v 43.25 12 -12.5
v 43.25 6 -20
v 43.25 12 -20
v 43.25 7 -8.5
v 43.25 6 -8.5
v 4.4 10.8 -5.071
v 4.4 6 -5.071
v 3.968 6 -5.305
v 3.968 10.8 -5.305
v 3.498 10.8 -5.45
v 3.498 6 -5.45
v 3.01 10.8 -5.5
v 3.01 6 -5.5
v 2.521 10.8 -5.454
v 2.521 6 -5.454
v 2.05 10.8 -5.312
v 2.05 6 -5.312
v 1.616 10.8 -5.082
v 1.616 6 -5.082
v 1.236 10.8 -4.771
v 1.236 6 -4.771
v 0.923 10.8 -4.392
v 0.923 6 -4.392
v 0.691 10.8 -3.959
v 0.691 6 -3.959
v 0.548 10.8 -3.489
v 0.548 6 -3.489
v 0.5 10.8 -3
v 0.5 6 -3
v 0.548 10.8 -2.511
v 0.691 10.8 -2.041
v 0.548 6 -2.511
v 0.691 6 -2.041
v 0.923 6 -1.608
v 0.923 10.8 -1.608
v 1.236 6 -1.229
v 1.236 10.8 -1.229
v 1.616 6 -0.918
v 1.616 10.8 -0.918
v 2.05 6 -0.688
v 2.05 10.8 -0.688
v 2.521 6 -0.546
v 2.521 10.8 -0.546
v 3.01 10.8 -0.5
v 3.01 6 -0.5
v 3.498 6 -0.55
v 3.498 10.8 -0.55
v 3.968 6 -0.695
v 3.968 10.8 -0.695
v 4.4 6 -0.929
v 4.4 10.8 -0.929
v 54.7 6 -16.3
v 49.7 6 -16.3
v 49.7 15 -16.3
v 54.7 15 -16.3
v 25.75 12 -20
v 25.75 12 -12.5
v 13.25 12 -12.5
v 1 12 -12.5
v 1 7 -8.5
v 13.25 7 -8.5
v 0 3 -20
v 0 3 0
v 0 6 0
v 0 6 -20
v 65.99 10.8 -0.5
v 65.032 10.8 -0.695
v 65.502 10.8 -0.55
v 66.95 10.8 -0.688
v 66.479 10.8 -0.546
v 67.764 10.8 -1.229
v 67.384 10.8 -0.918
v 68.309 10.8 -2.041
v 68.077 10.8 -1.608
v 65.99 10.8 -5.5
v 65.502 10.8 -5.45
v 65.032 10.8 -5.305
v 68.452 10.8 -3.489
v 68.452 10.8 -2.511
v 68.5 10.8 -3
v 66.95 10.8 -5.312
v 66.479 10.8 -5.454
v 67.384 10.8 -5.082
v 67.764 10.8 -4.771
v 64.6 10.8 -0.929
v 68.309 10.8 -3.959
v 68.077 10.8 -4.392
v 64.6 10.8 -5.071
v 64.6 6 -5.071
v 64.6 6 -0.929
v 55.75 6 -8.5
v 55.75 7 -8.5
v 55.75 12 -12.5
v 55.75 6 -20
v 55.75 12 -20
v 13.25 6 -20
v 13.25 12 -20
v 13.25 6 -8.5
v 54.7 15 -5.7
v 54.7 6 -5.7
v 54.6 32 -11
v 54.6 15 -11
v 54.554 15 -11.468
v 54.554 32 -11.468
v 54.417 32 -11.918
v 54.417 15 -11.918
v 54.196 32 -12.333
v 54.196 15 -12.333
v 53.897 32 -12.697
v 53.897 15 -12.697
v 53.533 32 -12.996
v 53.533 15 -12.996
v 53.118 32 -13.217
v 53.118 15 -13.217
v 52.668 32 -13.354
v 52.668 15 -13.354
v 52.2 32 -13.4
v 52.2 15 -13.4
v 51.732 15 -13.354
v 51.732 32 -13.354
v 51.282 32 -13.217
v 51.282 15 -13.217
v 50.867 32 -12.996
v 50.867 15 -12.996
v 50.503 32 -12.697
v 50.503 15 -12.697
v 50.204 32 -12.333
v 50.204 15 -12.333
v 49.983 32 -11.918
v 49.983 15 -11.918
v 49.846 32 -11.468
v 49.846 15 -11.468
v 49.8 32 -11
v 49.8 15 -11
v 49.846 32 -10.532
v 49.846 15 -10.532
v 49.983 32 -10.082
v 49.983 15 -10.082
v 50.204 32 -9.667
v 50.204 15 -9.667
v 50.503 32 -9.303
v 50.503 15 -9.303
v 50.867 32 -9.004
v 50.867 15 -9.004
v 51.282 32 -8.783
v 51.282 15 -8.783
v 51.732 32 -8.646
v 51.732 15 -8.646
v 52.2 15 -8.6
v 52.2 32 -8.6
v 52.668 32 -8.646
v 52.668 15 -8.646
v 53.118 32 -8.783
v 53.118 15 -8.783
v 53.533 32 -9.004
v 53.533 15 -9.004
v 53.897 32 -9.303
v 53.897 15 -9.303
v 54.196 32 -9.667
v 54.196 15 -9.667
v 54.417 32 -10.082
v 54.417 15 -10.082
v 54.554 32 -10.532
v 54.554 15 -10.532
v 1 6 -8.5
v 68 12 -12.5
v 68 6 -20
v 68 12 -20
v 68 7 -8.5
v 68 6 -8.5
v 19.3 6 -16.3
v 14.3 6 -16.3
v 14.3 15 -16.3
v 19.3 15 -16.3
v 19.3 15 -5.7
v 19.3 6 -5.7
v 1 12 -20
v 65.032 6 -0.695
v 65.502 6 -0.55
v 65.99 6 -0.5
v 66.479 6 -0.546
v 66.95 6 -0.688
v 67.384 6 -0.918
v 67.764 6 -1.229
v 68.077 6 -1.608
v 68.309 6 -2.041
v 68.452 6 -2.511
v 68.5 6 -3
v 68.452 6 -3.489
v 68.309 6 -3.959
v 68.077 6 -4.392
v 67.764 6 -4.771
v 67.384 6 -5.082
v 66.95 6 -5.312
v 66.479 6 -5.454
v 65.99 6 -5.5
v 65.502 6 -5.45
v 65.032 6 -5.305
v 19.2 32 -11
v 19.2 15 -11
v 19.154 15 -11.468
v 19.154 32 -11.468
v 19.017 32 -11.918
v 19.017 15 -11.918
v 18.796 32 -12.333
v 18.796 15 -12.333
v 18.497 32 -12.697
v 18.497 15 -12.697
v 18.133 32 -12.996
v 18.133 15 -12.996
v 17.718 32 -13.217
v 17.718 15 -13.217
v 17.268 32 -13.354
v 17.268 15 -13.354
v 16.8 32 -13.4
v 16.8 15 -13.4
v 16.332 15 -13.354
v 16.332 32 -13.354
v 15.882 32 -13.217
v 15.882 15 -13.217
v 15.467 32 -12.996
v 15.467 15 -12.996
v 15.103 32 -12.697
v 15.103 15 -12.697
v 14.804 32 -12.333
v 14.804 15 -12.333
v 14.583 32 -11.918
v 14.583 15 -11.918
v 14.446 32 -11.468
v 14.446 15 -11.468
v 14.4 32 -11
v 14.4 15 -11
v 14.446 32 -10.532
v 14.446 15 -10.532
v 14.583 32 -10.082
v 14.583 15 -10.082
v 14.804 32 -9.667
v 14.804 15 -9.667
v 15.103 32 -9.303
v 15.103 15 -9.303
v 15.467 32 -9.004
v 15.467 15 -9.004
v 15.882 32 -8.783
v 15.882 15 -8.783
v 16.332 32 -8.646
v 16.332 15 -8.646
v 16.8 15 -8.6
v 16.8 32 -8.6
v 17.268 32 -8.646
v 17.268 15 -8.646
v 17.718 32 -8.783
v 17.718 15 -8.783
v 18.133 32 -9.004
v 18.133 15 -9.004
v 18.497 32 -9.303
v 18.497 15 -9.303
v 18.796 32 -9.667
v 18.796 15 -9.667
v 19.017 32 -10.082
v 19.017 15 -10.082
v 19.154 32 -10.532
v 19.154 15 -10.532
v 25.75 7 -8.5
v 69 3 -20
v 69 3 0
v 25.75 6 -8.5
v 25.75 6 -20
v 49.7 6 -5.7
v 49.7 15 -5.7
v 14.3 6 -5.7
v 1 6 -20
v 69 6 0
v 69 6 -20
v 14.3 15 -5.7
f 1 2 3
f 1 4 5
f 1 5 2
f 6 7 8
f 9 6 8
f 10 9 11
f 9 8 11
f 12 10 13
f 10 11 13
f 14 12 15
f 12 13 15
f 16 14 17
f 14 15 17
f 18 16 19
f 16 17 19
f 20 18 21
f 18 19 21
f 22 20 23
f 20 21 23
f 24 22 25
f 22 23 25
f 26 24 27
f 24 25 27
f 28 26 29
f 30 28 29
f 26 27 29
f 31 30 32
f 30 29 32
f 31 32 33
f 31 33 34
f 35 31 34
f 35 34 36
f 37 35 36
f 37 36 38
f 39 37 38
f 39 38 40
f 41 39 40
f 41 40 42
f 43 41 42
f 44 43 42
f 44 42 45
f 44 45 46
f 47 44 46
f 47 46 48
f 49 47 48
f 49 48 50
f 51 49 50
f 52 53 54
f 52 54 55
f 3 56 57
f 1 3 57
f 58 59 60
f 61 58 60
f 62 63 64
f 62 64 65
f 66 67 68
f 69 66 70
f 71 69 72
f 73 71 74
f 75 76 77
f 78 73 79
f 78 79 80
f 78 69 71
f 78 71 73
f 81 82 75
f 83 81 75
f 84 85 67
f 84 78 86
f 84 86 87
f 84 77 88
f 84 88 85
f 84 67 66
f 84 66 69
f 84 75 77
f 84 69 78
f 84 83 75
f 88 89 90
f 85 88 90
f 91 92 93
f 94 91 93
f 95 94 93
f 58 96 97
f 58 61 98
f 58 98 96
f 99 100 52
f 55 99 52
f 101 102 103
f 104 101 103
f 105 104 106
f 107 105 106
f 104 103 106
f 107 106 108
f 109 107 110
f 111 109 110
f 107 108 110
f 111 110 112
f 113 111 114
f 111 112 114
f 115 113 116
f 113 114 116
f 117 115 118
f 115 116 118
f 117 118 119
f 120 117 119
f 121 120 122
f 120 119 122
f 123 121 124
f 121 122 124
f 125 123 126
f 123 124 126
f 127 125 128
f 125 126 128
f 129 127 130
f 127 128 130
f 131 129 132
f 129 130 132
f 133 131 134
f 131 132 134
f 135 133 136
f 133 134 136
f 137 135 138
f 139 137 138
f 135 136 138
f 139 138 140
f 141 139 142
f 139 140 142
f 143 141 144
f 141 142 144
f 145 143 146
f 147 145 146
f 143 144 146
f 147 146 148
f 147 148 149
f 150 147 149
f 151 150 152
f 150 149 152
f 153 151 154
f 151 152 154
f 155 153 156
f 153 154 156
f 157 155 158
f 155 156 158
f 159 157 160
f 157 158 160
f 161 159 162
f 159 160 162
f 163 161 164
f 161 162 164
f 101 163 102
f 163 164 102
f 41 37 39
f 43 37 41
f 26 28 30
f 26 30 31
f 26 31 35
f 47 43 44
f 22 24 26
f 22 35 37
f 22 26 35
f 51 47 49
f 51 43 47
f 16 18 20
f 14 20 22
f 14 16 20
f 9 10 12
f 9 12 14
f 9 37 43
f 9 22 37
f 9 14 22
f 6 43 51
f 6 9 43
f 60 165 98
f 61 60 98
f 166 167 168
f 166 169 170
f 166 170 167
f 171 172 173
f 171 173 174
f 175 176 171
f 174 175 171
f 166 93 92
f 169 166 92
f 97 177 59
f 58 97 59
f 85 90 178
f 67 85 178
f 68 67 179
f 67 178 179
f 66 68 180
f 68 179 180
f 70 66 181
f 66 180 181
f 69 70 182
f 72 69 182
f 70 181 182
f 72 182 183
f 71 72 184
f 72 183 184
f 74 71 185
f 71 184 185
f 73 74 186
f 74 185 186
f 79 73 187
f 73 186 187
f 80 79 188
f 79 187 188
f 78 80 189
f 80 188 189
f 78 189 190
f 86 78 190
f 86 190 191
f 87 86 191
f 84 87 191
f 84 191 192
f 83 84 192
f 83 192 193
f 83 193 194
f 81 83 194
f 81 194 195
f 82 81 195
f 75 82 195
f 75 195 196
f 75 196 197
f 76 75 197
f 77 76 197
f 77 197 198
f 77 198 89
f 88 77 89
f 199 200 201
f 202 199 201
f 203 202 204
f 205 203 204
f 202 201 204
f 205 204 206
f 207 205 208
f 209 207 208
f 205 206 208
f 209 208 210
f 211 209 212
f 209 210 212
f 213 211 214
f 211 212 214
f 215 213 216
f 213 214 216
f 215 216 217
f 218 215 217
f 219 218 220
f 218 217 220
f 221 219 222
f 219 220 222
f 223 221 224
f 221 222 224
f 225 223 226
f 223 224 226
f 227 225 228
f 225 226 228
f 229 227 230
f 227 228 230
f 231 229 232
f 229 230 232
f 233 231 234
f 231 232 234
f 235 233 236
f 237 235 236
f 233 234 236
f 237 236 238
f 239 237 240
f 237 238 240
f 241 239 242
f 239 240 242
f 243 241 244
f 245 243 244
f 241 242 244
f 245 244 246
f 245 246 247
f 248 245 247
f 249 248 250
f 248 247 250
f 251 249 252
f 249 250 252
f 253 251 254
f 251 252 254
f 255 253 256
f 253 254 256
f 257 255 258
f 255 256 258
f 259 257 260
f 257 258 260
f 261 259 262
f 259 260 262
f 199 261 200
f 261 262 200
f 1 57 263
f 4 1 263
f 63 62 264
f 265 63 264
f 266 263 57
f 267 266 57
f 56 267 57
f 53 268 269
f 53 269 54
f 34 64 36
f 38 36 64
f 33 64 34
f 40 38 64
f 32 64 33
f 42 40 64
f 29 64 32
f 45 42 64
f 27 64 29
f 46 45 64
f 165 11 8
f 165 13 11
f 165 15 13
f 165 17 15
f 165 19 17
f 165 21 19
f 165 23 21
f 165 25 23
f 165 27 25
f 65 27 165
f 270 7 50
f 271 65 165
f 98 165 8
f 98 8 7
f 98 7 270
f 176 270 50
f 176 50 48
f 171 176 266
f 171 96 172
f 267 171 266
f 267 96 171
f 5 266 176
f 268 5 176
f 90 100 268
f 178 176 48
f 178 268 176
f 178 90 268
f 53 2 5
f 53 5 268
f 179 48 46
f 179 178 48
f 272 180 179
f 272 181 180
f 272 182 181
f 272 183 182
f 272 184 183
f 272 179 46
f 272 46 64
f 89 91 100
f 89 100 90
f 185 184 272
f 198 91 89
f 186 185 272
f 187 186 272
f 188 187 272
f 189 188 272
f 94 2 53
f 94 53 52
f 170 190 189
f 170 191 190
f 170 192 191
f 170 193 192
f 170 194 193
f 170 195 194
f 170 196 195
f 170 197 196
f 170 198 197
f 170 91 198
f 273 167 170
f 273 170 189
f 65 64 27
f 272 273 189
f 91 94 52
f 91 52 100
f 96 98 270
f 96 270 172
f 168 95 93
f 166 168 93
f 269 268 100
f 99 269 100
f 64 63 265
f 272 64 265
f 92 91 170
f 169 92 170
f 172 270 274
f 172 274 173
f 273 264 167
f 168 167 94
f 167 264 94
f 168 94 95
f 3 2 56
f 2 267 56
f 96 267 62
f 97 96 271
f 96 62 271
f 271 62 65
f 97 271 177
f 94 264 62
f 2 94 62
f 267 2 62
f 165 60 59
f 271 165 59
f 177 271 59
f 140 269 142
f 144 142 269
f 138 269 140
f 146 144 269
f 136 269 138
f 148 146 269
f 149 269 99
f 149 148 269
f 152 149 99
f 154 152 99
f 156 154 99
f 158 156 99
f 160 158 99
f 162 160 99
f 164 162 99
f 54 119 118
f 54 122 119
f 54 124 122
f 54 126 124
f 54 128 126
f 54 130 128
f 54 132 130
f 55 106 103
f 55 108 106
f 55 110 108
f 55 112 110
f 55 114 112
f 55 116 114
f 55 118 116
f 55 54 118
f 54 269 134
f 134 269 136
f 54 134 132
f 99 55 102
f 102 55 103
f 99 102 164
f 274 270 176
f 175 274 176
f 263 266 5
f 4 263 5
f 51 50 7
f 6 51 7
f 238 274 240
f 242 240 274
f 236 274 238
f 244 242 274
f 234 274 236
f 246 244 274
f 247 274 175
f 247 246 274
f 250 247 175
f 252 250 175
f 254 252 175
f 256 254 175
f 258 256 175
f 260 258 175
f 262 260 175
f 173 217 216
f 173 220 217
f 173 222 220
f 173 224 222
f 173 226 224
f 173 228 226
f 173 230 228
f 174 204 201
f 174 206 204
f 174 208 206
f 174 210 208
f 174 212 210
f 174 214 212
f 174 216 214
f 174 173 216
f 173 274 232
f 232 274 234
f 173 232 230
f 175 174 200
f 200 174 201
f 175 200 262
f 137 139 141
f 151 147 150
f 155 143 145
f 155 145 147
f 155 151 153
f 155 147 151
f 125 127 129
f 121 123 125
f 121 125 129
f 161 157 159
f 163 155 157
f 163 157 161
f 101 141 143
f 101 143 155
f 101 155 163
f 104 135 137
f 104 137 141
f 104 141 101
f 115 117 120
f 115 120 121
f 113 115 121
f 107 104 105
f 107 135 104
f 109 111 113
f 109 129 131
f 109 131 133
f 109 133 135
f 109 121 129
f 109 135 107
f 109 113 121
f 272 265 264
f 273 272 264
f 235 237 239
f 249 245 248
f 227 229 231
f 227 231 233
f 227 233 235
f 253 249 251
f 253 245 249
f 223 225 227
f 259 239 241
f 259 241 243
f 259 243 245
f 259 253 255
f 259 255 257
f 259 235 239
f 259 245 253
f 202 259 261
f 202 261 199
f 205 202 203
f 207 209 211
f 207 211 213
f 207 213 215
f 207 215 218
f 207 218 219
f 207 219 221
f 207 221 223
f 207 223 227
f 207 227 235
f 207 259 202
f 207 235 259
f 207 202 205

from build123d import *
from OCP.BRepFilletAPI import BRepFilletAPI_MakeChamfer

# Parameters (mm, degrees)
SKETCH_1_W             = 69
SKETCH_1_H             = 20
EXTRUDE_1_DEPTH        = 3
FILLET_1_R             = 1
SKETCH_3_W             = 12.25
SKETCH_3_H             = 11.5
SKETCH_3_W_2           = 17.5
EXTRUDE_2_DEPTH        = 6
SKETCH_4_W             = 5
SKETCH_4_H             = 10.6
EXTRUDE_3_DEPTH        = 9
SKETCH_5_R             = 2.4
EXTRUDE_4_DEPTH        = 17
CHAMFER_1_SIZE         = 4
CHAMFER_1_SIZE2        = 5
EXTRUDE_5_DEPTH        = 4.8
MIRROR_START           = 3
MIRROR_1_OUTLINE_W     = 69
MIRROR_1_OUTLINE_H     = 20
MIRROR_1_DEPTH         = 3
MIRROR_START_2         = 6
MIRROR_1_2_OUTLINE_W   = 5
MIRROR_1_2_OUTLINE_H   = 10.6
MIRROR_1_2_DEPTH       = 9
MIRROR_START_3         = 15
MIRROR_1_3_OUTLINE_R   = 2.4
MIRROR_1_3_DEPTH       = 17
MIRROR_1_4_OUTLINE_W   = 12.25
MIRROR_1_4_OUTLINE_H   = 11.5
MIRROR_1_4_OUTLINE_W_2 = 17.5
MIRROR_1_4_DEPTH       = 1
MIRROR_START_4         = 6.49884
MIRROR_1_5_DEPTH       = 4.30116
MIRROR_START_5         = 25.75
MIRROR_1_6_DEPTH       = 17.5
MIRROR_START_6         = 1
MIRROR_1_7_DEPTH       = 12.25
MIRROR_START_7         = 55.75
MIRROR_1_8_DEPTH       = 12.25
SKETCH_7_W             = 69
SKETCH_7_H             = 20
CUT_EXTRUDE_1_DEPTH    = 78.472575793


with BuildPart() as part:
    # ｽｹｯﾁ1 → ﾎﾞｽ - 押し出し1 (new body)
    with BuildSketch(Plane(origin=(0, 0, 0), x_dir=(1, 0, 0), z_dir=(0, 1, 0))):
        with Locations((34.5, 10)):
            Rectangle(SKETCH_1_W, SKETCH_1_H)
    extrude(amount=EXTRUDE_1_DEPTH)

    # ﾌｨﾚｯﾄ1
    fillet_1_edges = [part.edges().sort_by_distance(p)[0] for p in [
        (0, 1.5, -20),
        (69, 1.5, -20),
        (69, 1.5, 0),
        (0, 1.5, 0),
    ]]
    fillet(fillet_1_edges, radius=FILLET_1_R)

    # ｽｹｯﾁ3 → ﾎﾞｽ - 押し出し2 (add)
    with BuildSketch(Plane.XZ):
        with Locations((7.125, -14.25)):
            Rectangle(SKETCH_3_W, SKETCH_3_H)
        with Locations((34.5, -14.25)):
            Rectangle(SKETCH_3_W_2, SKETCH_3_H)
        with Locations((61.875, -14.25)):
            Rectangle(SKETCH_3_W, SKETCH_3_H)
    extrude(amount=EXTRUDE_2_DEPTH)

    # ｽｹｯﾁ4 → ﾎﾞｽ - 押し出し3 (add)
    with BuildSketch(Plane.XZ):
        with Locations((52.2, -11)):
            Rectangle(SKETCH_4_W, SKETCH_4_H)
        with Locations((16.8, -11)):
            Rectangle(SKETCH_4_W, SKETCH_4_H)
    extrude(amount=EXTRUDE_3_DEPTH)

    # ｽｹｯﾁ5 → ﾎﾞｽ - 押し出し4 (add)
    with BuildSketch(Plane.XZ.offset(9)):
        with Locations(Location((16.8, -11, 0), (0, 0, 270))):
            Circle(SKETCH_5_R)
        with Locations(Location((52.2, -11, 0), (0, 0, 90))):
            Circle(SKETCH_5_R)
    extrude(amount=EXTRUDE_4_DEPTH)

    # 面取り1: one chamfer whose edges measure the first distance from different faces: ONE call of the kernel's chamfer builder (chamfer() names one face for all edges)
    chamfer_1_edges_1 = [part.edges().sort_by_distance(p)[0] for p in [
        (7.125, -6, -8.5),
    ]]
    chamfer_1_side_1 = [part.faces().sort_by_distance(p)[0] for p in [
        (7.125, -3, -8.5),
    ]]
    chamfer_1_edges_2 = [part.edges().sort_by_distance(p)[0] for p in [
        (34.5, -6, -8.5),
    ]]
    chamfer_1_side_2 = [part.faces().sort_by_distance(p)[0] for p in [
        (34.5, -3, -8.5),
    ]]
    chamfer_1_edges_3 = [part.edges().sort_by_distance(p)[0] for p in [
        (61.875, -6, -8.5),
    ]]
    chamfer_1_side_3 = [part.faces().sort_by_distance(p)[0] for p in [
        (61.875, -3, -8.5),
    ]]
    chamfer_1 = BRepFilletAPI_MakeChamfer(part.part.solid().wrapped)
    for e in chamfer_1_edges_1:
        chamfer_1.Add(CHAMFER_1_SIZE, CHAMFER_1_SIZE2, e.wrapped, chamfer_1_side_1[0].wrapped)  # the first distance lies on this face
    for e in chamfer_1_edges_2:
        chamfer_1.Add(CHAMFER_1_SIZE, CHAMFER_1_SIZE2, e.wrapped, chamfer_1_side_2[0].wrapped)  # the first distance lies on this face
    for e in chamfer_1_edges_3:
        chamfer_1.Add(CHAMFER_1_SIZE, CHAMFER_1_SIZE2, e.wrapped, chamfer_1_side_3[0].wrapped)  # the first distance lies on this face
    add(Compound.cast(chamfer_1.Shape()), mode=Mode.REPLACE)

    # ｽｹｯﾁ6 → ﾎﾞｽ - 押し出し5 (add)
    with BuildSketch(Plane.XZ):
        with BuildLine():
            Line((4.4, -5.071231518), (4.4, -0.928768482))
            ThreePointArc((4.4, -0.928768482), (0.5, -3), (4.4, -5.071231518))
        make_face()
        with BuildLine():
            ThreePointArc((68.5, -3), (67.17260394, -0.792059783), (64.6, -0.928768482))
            Line((64.6, -0.928768482), (64.6, -5.071231518))
            ThreePointArc((64.6, -5.071231518), (67.17260394, -5.207940217), (68.5, -3))
        make_face()
    extrude(amount=EXTRUDE_5_DEPTH)

    # ﾐﾗｰ1: read off the stored shape, not the designer's step
    # ﾐﾗｰ1 outline → ﾐﾗｰ1 (add)
    with BuildSketch(Plane(origin=(0, 0, 0), x_dir=(1, 0, 0), z_dir=(0, 1, 0)).offset(MIRROR_START)):
        with Locations((34.5, 10)):
            Rectangle(MIRROR_1_OUTLINE_W, MIRROR_1_OUTLINE_H)
    extrude(amount=MIRROR_1_DEPTH)

    # Mirror 1 2 outline → Mirror 1 2 (add)
    with BuildSketch(Plane(origin=(0, 0, 0), x_dir=(1, 0, 0), z_dir=(0, 1, 0)).offset(MIRROR_START_2)):
        with Locations((52.2, 11)):
            Rectangle(MIRROR_1_2_OUTLINE_W, MIRROR_1_2_OUTLINE_H)
        with Locations((16.8, 11)):
            Rectangle(MIRROR_1_2_OUTLINE_W, MIRROR_1_2_OUTLINE_H)
    extrude(amount=MIRROR_1_2_DEPTH)

    # Mirror 1 3 outline → Mirror 1 3 (add)
    with BuildSketch(Plane(origin=(0, 0, 0), x_dir=(1, 0, 0), z_dir=(0, 1, 0)).offset(MIRROR_START_3)):
        with Locations((16.8, 11)):
            Circle(MIRROR_1_3_OUTLINE_R)
        with Locations((52.2, 11)):
            Circle(MIRROR_1_3_OUTLINE_R)
    extrude(amount=MIRROR_1_3_DEPTH)

    # Mirror 1 4 outline → Mirror 1 4 (add)
    with BuildSketch(Plane(origin=(0, 0, 0), x_dir=(1, 0, 0), z_dir=(0, 1, 0)).offset(MIRROR_START_2)):
        with Locations((7.125, 14.25)):
            Rectangle(MIRROR_1_4_OUTLINE_W, MIRROR_1_4_OUTLINE_H)
        with Locations((61.875, 14.25)):
            Rectangle(MIRROR_1_4_OUTLINE_W, MIRROR_1_4_OUTLINE_H)
        with Locations((34.5, 14.25)):
            Rectangle(MIRROR_1_4_OUTLINE_W_2, MIRROR_1_4_OUTLINE_H)
        with BuildLine():
            ThreePointArc((4.4, 5.071231518), (0.5, 3), (4.4, 0.928768482))
            Line((4.4, 0.928768482), (4.4, 5.071231518))
        make_face()
        with BuildLine():
            ThreePointArc((64.6, 0.928768482), (68.5, 3), (64.6, 5.071231518))
            Line((64.6, 5.071231518), (64.6, 0.928768482))
        make_face()
    extrude(amount=MIRROR_1_4_DEPTH)

    # Mirror 1 5 outline → Mirror 1 5 (add)
    with BuildSketch(Plane(origin=(0, 0, 0), x_dir=(1, 0, 0), z_dir=(0, 1, 0)).offset(MIRROR_START_4)):
        with BuildLine():
            ThreePointArc((4.4, 5.071231518), (0.5, 3), (4.4, 0.928768482))
            Line((4.4, 0.928768482), (4.4, 5.071231518))
        make_face()
        with BuildLine():
            ThreePointArc((64.6, 0.928768482), (68.5, 3), (64.6, 5.071231518))
            Line((64.6, 5.071231518), (64.6, 0.928768482))
        make_face()
    extrude(amount=MIRROR_1_5_DEPTH)

    # Mirror 1 6 outline → Mirror 1 6 (add)
    with BuildSketch(Plane.YZ.offset(MIRROR_START_5)):
        Polygon((7, -20), (12, -20), (12, -12.5), (7, -8.5), align=None)
    extrude(amount=MIRROR_1_6_DEPTH)

    # Mirror 1 7 outline → Mirror 1 7 (add)
    with BuildSketch(Plane.YZ.offset(MIRROR_START_6)):
        Polygon((7, -20), (12, -20), (12, -12.5), (7, -8.5), align=None)
    extrude(amount=MIRROR_1_7_DEPTH)

    # Mirror 1 8 outline → Mirror 1 8 (add)
    with BuildSketch(Plane.YZ.offset(MIRROR_START_7)):
        Polygon((7, -20), (12, -20), (12, -12.5), (7, -8.5), align=None)
    extrude(amount=MIRROR_1_8_DEPTH)

    # ｽｹｯﾁ7 → ｶｯﾄ - 押し出し1 (cut, through all)
    with BuildSketch(Plane.XZ.offset(-3)):
        with Locations((34.5, -10)):
            Rectangle(SKETCH_7_W, SKETCH_7_H)
    extrude(amount=CUT_EXTRUDE_1_DEPTH, mode=Mode.SUBTRACT)


solid = part.part
